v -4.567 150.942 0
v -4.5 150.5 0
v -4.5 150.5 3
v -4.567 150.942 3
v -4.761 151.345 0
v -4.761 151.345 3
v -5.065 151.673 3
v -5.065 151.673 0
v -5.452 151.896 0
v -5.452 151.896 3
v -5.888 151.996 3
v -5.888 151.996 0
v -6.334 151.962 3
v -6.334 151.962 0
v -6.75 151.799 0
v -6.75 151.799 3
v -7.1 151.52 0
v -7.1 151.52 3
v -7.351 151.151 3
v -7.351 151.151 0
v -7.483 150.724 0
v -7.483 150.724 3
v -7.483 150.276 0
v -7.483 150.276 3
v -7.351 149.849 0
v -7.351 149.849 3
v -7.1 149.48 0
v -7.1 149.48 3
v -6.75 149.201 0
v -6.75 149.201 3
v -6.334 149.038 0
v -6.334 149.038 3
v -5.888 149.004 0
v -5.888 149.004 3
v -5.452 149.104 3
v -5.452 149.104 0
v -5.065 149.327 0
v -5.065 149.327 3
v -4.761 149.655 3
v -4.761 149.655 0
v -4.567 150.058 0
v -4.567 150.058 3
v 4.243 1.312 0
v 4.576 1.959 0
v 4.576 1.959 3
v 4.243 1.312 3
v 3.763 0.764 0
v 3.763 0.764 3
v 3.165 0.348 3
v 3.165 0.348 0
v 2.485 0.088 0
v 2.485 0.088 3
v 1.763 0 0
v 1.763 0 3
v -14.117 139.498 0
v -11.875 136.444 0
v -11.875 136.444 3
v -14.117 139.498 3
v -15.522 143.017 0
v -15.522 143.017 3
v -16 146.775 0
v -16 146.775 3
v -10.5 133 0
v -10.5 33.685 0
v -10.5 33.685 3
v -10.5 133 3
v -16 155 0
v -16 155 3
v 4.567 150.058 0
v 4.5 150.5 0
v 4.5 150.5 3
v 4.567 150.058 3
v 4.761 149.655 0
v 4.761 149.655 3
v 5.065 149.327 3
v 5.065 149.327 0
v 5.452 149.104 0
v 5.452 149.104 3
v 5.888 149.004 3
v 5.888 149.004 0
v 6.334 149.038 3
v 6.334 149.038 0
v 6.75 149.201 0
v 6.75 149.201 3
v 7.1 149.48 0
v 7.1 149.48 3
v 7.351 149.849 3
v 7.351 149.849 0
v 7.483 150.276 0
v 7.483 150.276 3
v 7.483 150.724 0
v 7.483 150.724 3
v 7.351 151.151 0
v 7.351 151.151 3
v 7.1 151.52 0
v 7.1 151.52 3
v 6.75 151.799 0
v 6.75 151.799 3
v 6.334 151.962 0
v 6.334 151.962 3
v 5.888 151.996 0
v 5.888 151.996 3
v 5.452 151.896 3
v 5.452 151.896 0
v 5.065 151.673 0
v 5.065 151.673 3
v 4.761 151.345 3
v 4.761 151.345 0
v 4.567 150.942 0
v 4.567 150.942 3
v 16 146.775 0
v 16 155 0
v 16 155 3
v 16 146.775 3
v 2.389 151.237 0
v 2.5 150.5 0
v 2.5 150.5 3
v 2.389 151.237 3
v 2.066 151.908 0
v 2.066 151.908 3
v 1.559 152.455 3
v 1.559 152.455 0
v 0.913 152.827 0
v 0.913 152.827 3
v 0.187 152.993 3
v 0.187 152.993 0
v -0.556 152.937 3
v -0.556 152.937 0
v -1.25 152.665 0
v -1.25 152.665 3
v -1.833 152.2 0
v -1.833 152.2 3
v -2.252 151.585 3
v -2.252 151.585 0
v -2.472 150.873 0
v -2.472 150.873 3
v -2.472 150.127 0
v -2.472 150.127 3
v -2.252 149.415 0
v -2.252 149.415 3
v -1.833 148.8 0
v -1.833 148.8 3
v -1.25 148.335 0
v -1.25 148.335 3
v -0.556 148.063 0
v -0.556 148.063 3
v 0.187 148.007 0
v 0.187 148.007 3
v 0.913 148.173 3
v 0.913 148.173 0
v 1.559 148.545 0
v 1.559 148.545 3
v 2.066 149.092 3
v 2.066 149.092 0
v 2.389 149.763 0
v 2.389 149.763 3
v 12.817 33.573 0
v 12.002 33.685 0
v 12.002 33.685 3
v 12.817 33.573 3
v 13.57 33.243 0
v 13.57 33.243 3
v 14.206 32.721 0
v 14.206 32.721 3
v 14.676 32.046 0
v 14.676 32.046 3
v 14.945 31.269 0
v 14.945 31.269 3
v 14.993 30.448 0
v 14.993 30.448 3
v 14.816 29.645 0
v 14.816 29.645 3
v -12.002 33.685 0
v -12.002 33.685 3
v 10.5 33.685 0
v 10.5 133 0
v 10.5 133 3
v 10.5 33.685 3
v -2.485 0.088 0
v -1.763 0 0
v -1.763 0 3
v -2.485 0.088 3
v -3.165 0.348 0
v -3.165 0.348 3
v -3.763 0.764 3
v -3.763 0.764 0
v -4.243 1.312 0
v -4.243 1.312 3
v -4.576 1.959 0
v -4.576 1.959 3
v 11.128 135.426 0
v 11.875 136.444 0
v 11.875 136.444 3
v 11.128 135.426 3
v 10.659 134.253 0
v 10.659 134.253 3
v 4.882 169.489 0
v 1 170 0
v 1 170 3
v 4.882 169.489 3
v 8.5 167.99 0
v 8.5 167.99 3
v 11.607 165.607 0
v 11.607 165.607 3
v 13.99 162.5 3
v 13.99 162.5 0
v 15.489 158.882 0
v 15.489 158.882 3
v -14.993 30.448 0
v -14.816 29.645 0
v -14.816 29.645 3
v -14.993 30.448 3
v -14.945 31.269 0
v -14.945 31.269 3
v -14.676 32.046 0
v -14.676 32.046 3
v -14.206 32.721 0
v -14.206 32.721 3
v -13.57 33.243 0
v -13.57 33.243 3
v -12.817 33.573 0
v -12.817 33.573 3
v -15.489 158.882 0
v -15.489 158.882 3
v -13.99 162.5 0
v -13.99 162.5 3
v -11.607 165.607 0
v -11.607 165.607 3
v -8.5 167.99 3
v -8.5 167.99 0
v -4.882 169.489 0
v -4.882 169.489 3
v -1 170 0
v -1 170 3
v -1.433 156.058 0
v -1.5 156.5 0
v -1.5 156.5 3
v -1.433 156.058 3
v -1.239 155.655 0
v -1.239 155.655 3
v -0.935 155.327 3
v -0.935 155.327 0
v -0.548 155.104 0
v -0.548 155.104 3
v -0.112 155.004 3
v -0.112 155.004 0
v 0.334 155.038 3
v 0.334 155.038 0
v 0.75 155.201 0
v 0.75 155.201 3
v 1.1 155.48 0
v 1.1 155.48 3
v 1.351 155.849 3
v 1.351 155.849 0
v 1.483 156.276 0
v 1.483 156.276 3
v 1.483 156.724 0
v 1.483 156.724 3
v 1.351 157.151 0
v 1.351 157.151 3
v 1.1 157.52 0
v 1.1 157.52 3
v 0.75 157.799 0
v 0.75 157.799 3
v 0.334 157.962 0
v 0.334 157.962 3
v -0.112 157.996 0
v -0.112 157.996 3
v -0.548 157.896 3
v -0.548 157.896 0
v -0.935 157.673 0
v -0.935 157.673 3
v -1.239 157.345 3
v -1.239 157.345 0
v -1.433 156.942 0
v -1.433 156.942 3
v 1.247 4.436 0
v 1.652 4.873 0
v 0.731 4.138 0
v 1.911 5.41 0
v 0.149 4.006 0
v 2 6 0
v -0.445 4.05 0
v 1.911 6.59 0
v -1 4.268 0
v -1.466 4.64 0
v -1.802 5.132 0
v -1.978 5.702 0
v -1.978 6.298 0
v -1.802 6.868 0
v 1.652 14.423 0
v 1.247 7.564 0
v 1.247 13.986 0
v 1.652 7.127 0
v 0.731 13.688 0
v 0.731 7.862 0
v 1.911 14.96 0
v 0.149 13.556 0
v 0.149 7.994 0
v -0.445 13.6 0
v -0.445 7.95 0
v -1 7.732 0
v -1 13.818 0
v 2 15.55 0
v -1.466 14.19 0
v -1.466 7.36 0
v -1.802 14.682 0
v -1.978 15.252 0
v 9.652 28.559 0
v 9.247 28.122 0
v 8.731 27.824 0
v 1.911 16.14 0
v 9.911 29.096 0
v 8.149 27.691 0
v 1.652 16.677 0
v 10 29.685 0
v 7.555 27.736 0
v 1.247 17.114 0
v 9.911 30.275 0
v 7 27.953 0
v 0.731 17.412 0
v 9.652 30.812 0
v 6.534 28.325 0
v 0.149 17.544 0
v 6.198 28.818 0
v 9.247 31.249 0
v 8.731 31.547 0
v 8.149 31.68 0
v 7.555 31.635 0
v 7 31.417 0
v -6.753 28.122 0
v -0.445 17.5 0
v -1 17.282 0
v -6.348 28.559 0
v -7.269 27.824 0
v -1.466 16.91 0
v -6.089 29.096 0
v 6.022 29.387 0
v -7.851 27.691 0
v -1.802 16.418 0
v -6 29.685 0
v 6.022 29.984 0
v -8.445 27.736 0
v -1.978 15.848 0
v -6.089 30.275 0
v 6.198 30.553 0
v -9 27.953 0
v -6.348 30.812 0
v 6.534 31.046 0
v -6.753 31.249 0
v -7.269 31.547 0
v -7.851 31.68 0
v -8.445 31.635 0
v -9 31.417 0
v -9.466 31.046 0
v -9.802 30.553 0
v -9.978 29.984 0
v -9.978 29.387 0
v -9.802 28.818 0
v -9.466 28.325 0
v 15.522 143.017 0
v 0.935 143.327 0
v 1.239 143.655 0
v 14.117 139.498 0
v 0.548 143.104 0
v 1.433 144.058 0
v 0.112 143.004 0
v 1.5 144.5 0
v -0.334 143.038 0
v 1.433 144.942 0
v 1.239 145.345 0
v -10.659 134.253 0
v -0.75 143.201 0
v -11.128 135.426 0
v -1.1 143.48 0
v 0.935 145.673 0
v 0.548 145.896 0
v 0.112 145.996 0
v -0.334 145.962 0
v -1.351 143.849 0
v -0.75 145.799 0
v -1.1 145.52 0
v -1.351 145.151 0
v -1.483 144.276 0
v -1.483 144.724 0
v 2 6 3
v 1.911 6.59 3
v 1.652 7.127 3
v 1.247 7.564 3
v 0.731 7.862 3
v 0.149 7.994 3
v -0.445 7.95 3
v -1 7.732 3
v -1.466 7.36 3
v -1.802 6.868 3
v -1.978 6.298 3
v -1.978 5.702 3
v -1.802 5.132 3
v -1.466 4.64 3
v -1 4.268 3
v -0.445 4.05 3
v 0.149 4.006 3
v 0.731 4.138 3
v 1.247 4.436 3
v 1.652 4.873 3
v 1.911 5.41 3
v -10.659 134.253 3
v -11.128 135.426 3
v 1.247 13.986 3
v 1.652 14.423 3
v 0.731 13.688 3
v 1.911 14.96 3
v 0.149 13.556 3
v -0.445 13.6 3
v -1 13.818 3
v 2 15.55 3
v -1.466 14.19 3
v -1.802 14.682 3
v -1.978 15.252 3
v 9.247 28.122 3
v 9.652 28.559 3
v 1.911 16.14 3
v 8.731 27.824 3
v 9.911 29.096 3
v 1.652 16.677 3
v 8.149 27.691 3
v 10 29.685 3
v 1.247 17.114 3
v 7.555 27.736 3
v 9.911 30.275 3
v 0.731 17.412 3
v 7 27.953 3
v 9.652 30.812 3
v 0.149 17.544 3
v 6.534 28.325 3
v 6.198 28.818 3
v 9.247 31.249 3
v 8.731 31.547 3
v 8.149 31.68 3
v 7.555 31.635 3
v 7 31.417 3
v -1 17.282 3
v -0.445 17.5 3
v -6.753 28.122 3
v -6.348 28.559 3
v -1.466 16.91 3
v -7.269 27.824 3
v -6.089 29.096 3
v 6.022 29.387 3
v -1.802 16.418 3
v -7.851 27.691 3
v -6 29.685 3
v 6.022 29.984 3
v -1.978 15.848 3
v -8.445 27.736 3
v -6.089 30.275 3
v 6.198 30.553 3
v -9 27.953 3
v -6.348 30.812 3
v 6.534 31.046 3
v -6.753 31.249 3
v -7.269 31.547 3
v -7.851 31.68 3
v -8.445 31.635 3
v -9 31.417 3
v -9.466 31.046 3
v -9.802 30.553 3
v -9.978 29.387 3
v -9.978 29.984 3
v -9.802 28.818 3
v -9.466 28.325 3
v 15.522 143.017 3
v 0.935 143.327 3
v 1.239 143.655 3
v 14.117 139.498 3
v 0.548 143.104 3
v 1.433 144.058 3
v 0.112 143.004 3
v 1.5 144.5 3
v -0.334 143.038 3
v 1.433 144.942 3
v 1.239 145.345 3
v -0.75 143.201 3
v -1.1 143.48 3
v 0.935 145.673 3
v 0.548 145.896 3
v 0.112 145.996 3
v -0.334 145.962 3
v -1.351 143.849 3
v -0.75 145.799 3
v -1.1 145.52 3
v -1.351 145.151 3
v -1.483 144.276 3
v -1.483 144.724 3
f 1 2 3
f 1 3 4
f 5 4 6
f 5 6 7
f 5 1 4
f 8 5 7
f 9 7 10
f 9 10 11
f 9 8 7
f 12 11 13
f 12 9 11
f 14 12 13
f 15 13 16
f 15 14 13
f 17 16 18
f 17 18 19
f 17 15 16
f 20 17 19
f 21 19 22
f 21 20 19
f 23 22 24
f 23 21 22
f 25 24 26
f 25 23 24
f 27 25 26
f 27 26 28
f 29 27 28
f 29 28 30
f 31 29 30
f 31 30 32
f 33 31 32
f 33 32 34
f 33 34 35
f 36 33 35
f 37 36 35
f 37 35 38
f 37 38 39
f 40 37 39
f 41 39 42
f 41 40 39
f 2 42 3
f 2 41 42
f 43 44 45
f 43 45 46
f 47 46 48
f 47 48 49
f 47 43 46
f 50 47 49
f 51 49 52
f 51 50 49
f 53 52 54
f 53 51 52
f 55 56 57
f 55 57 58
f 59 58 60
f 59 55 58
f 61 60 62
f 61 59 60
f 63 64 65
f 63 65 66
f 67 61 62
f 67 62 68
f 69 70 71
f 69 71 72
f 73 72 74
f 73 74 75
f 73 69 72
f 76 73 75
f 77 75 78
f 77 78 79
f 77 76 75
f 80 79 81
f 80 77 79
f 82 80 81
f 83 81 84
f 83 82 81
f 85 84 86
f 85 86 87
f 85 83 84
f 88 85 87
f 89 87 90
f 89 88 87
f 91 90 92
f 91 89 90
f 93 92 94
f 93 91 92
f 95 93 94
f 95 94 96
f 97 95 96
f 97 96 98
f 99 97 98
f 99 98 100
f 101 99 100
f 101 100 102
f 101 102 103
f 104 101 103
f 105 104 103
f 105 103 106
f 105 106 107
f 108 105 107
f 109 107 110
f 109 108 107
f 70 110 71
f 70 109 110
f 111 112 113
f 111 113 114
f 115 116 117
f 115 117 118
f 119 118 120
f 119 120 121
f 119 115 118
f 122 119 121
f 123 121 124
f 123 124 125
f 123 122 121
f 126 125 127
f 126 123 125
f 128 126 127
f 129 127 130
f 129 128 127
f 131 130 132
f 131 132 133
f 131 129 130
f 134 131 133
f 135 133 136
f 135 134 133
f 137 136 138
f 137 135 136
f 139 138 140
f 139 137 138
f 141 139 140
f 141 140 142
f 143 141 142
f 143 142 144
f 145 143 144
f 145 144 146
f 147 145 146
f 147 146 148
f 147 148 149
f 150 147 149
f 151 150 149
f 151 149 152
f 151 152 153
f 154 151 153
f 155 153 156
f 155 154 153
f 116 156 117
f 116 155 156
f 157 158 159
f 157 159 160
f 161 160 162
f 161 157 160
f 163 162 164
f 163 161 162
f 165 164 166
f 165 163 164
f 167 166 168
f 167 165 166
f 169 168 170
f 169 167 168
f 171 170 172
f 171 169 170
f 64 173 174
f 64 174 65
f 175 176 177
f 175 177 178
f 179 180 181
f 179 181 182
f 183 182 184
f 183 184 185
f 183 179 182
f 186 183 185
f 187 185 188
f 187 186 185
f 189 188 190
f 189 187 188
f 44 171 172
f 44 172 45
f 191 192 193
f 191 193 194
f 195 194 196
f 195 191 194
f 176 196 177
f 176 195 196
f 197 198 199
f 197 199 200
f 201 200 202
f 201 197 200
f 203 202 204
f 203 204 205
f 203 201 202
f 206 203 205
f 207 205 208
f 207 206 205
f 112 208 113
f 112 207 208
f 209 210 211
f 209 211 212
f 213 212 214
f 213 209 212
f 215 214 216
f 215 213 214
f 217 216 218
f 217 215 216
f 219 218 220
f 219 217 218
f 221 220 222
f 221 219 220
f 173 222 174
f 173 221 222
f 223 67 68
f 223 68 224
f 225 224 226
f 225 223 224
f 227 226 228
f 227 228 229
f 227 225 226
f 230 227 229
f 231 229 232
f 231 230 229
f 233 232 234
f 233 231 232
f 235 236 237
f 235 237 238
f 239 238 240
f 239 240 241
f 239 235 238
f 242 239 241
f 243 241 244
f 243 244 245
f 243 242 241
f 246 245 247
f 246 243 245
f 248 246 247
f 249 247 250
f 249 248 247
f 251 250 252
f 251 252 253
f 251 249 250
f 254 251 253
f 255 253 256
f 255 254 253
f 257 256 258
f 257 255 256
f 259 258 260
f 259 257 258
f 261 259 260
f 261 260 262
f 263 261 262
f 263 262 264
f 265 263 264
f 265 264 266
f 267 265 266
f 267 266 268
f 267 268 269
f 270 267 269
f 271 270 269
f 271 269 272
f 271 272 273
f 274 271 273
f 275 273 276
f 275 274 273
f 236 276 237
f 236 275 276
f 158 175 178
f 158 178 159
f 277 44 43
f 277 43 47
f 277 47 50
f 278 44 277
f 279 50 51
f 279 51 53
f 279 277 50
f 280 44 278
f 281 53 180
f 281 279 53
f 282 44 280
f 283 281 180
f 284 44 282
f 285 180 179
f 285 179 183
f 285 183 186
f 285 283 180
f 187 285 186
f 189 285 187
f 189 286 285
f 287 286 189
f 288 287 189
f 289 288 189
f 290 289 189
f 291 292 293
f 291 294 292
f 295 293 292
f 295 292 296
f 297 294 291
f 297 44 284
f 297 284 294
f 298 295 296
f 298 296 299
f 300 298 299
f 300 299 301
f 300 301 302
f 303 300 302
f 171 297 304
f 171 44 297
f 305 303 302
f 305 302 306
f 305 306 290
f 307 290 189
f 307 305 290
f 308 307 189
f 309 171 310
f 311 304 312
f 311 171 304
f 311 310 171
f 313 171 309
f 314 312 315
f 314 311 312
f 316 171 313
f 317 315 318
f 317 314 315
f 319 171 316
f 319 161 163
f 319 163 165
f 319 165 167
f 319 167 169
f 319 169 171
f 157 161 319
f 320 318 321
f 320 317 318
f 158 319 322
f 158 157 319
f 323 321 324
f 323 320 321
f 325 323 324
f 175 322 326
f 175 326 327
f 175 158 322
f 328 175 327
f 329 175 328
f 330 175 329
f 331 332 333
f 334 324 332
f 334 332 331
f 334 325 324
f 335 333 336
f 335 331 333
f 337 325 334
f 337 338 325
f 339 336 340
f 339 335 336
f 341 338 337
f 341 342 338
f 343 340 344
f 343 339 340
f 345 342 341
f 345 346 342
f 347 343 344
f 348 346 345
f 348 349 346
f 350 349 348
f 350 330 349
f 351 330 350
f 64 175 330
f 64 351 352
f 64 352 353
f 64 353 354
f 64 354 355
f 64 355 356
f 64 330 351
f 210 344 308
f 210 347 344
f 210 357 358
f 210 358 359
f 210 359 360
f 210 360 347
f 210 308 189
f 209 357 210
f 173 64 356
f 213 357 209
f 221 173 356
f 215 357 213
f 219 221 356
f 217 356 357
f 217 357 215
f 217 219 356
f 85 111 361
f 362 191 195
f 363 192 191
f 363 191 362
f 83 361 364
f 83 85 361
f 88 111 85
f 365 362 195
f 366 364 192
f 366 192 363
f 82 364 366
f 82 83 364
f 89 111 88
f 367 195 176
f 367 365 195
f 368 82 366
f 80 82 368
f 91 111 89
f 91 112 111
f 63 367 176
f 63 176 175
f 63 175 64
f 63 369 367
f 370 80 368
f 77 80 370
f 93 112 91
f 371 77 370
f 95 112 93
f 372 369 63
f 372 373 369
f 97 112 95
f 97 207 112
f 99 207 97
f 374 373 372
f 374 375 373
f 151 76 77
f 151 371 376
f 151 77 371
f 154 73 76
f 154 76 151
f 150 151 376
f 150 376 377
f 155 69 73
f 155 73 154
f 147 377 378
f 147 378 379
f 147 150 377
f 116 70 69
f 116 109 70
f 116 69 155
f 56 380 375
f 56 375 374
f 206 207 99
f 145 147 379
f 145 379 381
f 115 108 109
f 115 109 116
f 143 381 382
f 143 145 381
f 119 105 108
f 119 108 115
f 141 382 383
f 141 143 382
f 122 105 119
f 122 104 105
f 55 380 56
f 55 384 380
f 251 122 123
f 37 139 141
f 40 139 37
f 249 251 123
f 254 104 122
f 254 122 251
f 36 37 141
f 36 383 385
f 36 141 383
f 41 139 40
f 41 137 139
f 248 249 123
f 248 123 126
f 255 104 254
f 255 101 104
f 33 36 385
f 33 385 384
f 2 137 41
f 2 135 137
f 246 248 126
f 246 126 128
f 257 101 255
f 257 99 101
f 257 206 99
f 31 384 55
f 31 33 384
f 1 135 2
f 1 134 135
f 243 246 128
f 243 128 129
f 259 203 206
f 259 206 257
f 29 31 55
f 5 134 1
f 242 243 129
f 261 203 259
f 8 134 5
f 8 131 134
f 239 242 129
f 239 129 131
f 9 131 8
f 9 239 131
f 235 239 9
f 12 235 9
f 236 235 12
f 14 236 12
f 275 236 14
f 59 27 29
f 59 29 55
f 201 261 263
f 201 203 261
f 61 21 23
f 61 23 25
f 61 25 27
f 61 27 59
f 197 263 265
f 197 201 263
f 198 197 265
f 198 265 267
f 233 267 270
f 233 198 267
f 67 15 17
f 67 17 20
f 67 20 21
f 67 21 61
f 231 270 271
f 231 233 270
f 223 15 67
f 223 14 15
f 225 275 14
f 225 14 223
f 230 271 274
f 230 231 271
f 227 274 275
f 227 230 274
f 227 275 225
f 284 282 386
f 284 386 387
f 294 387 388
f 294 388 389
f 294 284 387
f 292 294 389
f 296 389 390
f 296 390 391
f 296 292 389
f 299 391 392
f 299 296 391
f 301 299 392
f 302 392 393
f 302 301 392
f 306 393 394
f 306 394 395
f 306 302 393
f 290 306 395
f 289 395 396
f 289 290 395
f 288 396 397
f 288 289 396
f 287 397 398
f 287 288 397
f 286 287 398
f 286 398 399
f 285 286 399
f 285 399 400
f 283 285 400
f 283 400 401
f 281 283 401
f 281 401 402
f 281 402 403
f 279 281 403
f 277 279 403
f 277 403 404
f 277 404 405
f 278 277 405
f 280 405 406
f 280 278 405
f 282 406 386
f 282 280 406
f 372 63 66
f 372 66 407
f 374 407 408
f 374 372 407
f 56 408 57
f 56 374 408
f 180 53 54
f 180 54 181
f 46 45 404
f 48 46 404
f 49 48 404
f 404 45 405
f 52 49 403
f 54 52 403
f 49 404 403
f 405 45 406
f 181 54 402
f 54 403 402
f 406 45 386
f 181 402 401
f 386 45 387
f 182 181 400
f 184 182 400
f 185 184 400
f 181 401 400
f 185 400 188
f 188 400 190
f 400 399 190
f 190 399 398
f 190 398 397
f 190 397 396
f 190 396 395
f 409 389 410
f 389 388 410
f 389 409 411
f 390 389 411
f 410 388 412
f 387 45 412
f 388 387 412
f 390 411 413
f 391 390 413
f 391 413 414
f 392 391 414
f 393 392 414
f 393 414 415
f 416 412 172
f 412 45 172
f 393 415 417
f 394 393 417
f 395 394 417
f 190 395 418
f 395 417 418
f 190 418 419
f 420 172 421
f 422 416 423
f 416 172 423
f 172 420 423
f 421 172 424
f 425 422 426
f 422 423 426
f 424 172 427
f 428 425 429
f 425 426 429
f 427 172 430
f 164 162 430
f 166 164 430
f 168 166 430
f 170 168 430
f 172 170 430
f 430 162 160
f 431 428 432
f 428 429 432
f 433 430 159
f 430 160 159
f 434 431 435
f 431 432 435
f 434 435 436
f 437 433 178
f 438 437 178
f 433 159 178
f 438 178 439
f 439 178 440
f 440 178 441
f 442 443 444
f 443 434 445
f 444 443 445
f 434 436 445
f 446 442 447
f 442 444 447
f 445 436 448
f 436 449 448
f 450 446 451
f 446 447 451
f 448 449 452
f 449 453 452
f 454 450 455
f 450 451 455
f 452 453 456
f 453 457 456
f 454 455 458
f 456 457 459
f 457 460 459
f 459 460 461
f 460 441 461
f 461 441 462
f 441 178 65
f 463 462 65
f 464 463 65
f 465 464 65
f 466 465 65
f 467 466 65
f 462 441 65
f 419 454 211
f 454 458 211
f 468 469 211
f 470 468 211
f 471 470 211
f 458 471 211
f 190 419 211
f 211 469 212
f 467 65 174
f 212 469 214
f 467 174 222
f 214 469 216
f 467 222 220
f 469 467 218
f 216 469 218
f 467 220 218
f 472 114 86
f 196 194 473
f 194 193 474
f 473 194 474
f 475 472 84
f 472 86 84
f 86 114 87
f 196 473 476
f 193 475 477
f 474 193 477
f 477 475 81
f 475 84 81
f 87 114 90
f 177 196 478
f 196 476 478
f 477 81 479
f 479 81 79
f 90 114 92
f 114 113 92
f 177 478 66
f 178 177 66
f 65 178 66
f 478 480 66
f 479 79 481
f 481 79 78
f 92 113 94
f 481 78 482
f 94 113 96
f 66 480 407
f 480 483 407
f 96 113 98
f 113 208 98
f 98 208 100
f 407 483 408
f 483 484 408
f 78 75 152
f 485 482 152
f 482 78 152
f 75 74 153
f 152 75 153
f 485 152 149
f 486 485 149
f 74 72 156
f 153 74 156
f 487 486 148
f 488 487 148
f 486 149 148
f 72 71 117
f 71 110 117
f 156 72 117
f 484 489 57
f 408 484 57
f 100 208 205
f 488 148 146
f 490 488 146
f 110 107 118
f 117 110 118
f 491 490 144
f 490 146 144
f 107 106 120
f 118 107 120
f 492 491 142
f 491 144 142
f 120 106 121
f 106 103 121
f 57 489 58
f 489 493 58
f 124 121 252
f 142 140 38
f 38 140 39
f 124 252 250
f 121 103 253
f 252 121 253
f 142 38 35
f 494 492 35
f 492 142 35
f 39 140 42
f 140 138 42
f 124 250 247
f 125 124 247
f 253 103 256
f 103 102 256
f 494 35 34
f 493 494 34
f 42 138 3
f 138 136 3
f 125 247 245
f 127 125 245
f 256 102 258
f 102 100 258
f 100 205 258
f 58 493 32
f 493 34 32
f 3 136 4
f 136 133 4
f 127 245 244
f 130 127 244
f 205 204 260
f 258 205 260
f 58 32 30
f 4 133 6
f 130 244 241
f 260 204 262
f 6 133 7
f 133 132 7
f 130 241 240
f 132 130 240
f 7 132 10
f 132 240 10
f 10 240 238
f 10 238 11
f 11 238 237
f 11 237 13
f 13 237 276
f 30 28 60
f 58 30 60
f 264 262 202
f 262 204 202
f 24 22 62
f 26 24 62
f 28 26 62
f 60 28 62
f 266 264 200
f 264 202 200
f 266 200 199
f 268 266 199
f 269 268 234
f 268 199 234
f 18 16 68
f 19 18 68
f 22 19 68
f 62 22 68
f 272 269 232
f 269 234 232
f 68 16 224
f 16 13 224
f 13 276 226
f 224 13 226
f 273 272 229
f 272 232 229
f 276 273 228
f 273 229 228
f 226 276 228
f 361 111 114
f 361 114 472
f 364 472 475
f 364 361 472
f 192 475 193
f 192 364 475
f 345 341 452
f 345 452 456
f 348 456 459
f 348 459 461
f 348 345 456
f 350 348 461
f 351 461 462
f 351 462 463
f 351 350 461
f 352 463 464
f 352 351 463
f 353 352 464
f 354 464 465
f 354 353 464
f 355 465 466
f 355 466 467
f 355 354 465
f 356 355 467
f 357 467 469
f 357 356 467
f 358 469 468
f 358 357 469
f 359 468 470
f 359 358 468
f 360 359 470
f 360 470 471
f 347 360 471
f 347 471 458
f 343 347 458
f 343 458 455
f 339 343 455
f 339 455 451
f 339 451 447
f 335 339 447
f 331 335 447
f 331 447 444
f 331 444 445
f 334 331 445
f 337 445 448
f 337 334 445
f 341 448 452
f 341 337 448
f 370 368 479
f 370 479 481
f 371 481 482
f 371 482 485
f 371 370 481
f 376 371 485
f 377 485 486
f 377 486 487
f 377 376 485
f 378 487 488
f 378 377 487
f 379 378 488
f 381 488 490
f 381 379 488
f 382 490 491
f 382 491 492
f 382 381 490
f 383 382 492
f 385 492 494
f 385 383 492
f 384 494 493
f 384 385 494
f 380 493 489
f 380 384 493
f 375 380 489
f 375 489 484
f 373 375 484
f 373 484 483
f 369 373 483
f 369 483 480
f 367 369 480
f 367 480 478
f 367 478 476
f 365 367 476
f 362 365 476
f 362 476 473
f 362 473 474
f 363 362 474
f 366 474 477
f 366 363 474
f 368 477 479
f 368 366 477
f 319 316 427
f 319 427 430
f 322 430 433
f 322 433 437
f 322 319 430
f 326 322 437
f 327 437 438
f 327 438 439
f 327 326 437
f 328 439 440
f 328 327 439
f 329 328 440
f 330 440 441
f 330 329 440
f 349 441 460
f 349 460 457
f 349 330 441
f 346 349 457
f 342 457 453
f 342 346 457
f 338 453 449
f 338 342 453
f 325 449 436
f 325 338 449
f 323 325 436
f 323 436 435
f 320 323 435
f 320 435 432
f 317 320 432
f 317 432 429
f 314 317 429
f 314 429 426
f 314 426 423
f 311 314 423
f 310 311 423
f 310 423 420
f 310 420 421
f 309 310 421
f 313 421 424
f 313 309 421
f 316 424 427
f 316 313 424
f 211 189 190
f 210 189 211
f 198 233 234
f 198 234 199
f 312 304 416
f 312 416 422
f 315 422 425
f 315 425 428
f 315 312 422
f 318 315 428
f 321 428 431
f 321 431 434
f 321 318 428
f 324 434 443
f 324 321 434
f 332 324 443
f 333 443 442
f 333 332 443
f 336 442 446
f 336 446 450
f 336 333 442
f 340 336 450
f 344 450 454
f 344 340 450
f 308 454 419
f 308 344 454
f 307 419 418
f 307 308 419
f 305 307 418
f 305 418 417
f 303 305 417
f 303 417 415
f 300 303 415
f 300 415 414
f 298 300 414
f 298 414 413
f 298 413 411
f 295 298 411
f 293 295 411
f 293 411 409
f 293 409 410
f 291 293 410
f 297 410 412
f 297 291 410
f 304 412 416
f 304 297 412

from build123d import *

# Parameters (mm, degrees)
CROQUIS1_R              = 2
CROQUIS1_R_2            = 2.5
CROQUIS1_R_3            = 1.5
SALIENTE_EXTRUIR1_DEPTH = 3


with BuildPart() as part:
    # Croquis1 → Saliente-Extruir1 (new body)
    with BuildSketch(Plane.XY):
        with BuildLine():
            Line((1.762553306, 0), (-1.762553306, 0))
            ThreePointArc((-1.762553306, 0), (-3.476899283, 0.538086543), (-4.576267594, 1.95932142))
            Line((-4.576267594, 1.95932142), (-14.815986324, 29.644759985))
            ThreePointArc((-14.815986324, 29.644759985), (-14.464185493, 32.399784542), (-12.002272036, 33.685438565))
            Line((-12.002272036, 33.685438565), (-10.5, 33.685438565))
            Line((-10.5, 33.685438565), (-10.5, 133))
            ThreePointArc((-10.5, 133), (-10.856456095, 134.854049622), (-11.875, 136.443744328))
            ThreePointArc((-11.875, 136.443744328), (-14.930631716, 141.212828449), (-16, 146.774977314))
            Line((-16, 146.774977314), (-16, 155))
            ThreePointArc((-16, 155), (-11.606601718, 165.606601718), (-1, 170))
            Line((-1, 170), (1, 170))
            ThreePointArc((1, 170), (11.606601718, 165.606601718), (16, 155))
            Line((16, 155), (16, 146.774977314))
            ThreePointArc((16, 146.774977314), (14.930631716, 141.212828449), (11.875, 136.443744328))
            ThreePointArc((11.875, 136.443744328), (10.856456095, 134.854049622), (10.5, 133))
            Line((10.5, 133), (10.5, 33.685438565))
            Line((10.5, 33.685438565), (12.002272036, 33.685438565))
            ThreePointArc((12.002272036, 33.685438565), (14.464185493, 32.399784542), (14.815986324, 29.644759985))
            Line((14.815986324, 29.644759985), (4.576267594, 1.95932142))
            ThreePointArc((4.576267594, 1.95932142), (3.476899283, 0.538086543), (1.762553306, 0))
        make_face()
        with Locations((0, 6)):
            Circle(CROQUIS1_R, mode=Mode.SUBTRACT)
        with Locations((0, 150.5)):
            Circle(CROQUIS1_R_2, mode=Mode.SUBTRACT)
        with Locations((0, 144.5)):
            Circle(CROQUIS1_R_3, mode=Mode.SUBTRACT)
        with Locations((-6, 150.5)):
            Circle(CROQUIS1_R_3, mode=Mode.SUBTRACT)
        with Locations(Location((0, 156.5, 0), (0, 0, 180))):
            Circle(CROQUIS1_R_3, mode=Mode.SUBTRACT)
        with Locations(Location((6, 150.5, 0), (0, 0, 180))):
            Circle(CROQUIS1_R_3, mode=Mode.SUBTRACT)
        with Locations((-8, 29.685438565)):
            Circle(CROQUIS1_R, mode=Mode.SUBTRACT)
        with Locations((8, 29.685438565)):
            Circle(CROQUIS1_R, mode=Mode.SUBTRACT)
        with Locations((0, 15.55)):
            Circle(CROQUIS1_R, mode=Mode.SUBTRACT)
    extrude(amount=SALIENTE_EXTRUIR1_DEPTH)


solid = part.part
